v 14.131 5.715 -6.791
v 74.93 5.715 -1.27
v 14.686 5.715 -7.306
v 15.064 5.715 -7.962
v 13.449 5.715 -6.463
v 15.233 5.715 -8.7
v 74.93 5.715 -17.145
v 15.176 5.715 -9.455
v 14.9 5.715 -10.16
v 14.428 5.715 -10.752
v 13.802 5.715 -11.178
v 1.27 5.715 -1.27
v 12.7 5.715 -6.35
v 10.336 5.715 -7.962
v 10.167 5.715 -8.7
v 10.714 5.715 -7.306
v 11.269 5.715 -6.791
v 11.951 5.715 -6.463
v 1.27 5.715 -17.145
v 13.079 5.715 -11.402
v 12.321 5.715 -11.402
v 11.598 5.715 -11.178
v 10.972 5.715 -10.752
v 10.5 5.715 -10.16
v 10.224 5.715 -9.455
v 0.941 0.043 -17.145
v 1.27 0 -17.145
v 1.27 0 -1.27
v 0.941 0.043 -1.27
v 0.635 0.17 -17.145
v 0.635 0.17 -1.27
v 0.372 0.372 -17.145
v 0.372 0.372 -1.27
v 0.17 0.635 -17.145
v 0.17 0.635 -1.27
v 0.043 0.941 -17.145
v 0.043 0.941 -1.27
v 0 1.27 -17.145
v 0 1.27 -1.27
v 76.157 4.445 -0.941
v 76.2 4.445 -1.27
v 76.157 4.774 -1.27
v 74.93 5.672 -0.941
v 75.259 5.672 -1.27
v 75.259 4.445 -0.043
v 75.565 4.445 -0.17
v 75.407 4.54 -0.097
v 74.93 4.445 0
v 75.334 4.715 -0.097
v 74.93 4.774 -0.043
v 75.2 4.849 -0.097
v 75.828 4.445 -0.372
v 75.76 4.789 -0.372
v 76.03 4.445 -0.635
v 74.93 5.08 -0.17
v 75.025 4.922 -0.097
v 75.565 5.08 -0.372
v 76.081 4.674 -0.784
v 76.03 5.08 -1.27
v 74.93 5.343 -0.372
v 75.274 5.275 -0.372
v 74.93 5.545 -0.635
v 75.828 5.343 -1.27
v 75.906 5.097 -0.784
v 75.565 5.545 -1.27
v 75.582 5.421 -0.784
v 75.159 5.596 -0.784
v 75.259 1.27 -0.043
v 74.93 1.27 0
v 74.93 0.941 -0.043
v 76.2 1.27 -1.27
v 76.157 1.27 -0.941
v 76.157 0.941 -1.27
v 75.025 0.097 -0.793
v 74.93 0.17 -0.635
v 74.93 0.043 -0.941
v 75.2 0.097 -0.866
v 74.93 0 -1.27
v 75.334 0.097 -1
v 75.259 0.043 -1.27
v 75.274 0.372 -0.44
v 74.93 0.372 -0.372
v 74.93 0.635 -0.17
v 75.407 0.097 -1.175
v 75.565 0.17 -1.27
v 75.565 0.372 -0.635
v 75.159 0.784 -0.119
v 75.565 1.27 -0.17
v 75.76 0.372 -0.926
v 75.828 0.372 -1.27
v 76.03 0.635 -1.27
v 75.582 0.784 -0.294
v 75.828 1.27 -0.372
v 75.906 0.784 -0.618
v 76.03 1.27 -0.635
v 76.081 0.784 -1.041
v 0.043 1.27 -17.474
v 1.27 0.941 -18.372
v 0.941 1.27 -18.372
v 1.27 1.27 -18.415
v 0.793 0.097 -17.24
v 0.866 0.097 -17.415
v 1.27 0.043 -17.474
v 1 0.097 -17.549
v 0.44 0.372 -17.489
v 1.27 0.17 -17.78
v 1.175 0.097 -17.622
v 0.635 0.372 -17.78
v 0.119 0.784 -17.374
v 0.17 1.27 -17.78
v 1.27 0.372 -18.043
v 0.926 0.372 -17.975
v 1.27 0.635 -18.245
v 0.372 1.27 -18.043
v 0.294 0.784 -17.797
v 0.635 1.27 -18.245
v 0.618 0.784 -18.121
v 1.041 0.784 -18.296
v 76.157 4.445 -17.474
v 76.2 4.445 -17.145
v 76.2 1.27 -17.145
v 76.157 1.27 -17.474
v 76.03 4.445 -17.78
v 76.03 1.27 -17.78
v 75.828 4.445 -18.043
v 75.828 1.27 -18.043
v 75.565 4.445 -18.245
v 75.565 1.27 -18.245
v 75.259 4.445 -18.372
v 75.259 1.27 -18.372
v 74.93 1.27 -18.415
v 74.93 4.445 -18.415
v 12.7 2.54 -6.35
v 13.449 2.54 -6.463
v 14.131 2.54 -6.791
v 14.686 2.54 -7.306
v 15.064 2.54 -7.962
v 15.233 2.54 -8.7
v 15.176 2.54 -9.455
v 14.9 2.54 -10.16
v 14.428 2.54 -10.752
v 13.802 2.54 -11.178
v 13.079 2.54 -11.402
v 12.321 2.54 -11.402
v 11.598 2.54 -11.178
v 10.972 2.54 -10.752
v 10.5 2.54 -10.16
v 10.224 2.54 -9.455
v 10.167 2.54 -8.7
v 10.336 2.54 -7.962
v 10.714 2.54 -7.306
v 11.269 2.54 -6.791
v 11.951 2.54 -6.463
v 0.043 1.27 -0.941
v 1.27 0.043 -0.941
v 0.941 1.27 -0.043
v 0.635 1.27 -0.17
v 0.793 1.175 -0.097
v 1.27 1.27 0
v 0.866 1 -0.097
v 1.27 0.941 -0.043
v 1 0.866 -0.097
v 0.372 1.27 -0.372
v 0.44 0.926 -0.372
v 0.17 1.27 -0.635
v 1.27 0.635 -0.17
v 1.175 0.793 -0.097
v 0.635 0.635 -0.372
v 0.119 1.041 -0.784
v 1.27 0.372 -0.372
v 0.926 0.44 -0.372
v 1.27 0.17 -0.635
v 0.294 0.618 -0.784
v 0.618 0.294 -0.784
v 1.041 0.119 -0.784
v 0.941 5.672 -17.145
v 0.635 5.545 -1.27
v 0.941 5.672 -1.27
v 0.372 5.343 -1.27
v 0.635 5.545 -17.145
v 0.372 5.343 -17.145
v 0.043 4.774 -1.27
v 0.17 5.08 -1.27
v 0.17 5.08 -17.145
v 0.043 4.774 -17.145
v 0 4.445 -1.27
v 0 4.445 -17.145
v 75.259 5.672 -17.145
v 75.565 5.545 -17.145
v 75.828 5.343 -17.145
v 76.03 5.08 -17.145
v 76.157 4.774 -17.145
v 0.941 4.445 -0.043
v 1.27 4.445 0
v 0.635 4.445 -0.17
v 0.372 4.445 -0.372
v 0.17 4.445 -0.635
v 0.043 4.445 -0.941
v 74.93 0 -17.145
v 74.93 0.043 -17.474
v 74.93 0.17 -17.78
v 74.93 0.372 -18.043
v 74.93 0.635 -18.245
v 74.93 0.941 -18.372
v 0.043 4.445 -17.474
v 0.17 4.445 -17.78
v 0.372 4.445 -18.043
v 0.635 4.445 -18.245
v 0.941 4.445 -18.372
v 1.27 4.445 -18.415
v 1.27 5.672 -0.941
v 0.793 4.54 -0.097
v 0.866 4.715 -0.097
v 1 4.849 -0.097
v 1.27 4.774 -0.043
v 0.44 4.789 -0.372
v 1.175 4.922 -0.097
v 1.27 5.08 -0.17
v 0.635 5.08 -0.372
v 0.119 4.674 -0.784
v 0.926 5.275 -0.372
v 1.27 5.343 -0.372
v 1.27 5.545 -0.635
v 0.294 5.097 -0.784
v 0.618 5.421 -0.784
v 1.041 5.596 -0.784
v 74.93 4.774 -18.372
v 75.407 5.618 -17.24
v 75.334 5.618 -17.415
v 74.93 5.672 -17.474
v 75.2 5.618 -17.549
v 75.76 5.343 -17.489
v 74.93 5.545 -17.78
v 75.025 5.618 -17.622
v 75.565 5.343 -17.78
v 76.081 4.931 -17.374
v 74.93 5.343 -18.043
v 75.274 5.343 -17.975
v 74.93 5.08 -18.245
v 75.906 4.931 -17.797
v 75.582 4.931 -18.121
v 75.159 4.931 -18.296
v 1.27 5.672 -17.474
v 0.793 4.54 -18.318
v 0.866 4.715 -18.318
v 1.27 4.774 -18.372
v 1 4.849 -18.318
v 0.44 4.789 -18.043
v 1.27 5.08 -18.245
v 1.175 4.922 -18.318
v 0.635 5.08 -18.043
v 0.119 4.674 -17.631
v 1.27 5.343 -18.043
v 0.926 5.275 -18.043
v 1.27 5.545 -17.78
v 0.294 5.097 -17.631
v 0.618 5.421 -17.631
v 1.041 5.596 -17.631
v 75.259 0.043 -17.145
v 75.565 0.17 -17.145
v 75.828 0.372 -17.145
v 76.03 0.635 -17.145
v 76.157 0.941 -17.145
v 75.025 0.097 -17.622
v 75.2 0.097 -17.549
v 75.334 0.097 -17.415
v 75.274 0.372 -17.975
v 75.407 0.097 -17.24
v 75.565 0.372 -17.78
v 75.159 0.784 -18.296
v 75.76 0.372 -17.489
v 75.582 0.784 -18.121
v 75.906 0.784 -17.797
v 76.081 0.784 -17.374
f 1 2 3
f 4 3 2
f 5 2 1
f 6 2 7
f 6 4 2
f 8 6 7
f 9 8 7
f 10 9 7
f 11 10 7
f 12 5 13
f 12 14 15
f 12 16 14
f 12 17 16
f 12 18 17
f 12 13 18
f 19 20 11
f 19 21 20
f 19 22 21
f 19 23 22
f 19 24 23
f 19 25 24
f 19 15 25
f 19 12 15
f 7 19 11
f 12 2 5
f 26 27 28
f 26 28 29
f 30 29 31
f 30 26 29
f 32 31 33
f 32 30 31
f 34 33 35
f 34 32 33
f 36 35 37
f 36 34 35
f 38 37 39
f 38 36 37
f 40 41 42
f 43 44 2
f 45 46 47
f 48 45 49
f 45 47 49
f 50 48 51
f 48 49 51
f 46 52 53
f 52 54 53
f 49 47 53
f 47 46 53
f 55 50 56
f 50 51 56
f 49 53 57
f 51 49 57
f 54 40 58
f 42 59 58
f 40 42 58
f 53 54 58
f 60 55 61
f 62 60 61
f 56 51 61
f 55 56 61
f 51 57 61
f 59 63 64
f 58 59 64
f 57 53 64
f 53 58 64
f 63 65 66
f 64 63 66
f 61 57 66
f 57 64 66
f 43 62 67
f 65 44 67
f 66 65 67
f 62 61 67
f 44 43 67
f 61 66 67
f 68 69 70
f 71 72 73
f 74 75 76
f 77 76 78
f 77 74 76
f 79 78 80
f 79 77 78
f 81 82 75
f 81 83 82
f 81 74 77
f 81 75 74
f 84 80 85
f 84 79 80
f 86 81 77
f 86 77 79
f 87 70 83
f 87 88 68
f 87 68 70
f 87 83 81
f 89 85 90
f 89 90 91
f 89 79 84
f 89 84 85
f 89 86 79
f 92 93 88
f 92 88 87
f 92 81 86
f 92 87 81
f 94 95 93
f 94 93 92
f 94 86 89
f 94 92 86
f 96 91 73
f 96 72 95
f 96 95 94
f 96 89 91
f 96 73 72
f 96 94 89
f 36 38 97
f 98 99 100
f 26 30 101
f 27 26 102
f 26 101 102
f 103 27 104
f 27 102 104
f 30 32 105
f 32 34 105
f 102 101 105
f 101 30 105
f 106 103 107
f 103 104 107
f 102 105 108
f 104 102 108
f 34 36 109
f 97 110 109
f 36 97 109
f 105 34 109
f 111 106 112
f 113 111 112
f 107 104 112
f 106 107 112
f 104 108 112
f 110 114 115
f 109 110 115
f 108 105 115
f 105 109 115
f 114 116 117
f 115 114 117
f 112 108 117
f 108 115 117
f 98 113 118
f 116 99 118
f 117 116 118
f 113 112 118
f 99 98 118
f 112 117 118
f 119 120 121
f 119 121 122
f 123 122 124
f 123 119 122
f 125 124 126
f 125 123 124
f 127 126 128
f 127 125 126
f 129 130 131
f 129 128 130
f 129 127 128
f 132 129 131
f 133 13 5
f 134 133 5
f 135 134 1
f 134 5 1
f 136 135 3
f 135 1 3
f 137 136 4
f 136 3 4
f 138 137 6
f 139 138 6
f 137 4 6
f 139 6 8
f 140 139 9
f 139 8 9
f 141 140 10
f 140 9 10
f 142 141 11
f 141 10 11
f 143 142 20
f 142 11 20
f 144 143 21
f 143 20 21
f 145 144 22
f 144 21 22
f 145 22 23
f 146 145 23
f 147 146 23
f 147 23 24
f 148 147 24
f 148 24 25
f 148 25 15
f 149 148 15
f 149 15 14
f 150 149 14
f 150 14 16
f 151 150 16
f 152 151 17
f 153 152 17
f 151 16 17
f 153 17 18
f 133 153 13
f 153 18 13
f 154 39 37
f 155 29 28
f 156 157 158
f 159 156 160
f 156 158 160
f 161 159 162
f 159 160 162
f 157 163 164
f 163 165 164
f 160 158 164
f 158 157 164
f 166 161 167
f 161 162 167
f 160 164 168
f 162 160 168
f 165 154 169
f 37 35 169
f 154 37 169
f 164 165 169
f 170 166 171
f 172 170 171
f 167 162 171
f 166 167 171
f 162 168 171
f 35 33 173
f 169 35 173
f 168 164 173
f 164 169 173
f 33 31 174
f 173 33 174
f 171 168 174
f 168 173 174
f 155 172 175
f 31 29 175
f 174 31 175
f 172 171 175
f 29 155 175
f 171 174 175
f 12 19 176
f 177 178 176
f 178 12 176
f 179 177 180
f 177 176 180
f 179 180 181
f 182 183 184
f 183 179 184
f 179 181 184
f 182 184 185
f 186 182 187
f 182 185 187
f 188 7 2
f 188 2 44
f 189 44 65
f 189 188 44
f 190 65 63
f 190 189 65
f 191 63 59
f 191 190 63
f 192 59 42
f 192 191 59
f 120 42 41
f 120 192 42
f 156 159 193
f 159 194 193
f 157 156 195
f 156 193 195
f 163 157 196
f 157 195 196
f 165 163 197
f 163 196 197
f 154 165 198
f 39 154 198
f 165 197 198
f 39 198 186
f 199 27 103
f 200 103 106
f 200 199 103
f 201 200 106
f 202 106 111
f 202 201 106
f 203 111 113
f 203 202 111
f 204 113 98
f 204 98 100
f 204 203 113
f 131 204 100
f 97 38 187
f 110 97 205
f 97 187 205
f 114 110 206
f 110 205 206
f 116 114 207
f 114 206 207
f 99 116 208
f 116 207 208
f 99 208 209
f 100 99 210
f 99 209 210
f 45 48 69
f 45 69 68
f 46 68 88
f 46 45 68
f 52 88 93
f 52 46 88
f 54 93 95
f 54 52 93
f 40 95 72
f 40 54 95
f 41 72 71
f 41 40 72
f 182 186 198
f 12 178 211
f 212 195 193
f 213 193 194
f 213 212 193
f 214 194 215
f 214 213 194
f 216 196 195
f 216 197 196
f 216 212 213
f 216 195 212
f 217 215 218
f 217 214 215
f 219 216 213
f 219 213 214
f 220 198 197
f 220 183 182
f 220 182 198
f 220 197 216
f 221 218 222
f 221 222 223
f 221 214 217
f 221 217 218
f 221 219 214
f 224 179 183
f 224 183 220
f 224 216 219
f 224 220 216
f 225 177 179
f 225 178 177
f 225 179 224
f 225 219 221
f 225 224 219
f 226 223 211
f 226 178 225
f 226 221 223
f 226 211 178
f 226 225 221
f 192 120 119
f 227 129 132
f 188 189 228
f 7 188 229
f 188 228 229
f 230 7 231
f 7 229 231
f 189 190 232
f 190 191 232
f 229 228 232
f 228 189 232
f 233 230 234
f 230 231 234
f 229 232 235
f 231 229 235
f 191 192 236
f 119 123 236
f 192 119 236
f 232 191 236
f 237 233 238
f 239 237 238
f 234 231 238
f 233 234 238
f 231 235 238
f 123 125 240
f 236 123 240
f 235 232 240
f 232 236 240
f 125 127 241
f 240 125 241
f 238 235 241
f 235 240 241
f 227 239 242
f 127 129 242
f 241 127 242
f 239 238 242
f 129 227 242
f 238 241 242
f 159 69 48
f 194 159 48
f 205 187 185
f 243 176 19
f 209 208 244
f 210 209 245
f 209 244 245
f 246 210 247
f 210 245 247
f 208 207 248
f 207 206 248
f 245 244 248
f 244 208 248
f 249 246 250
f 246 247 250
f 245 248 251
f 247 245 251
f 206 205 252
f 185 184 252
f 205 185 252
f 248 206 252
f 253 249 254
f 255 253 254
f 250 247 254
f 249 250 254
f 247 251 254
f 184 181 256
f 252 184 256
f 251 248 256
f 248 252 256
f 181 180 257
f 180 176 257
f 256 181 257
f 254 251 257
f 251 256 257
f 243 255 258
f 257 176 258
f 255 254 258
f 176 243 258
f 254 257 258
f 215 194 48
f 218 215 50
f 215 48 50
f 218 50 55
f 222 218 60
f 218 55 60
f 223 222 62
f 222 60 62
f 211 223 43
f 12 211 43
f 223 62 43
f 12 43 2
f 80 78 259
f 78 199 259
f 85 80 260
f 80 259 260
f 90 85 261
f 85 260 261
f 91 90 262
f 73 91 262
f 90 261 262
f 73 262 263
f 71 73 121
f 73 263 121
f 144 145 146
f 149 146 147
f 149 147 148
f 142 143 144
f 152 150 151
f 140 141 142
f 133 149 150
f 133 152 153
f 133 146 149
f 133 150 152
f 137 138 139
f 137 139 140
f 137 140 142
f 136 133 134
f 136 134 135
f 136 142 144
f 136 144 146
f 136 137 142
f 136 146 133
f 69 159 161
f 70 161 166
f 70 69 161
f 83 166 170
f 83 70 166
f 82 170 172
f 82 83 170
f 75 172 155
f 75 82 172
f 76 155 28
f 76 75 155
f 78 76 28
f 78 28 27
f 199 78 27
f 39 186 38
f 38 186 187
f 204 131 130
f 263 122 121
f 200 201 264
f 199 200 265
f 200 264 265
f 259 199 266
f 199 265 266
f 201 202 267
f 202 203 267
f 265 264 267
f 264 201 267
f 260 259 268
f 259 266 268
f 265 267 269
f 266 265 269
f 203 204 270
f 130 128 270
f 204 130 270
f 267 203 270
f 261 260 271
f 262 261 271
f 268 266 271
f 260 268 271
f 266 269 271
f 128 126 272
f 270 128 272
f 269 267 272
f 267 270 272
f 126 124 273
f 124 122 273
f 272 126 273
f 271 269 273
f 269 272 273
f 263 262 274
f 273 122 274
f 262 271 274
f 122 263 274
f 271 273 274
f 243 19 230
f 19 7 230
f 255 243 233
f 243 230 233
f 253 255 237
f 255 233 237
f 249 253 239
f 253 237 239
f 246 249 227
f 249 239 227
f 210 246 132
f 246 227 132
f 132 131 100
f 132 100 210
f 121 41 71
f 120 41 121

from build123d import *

# Parameters (mm, degrees)
SKETCH1_W           = 18.415
SKETCH1_H           = 5.715
BOSS_EXTRUDE1_DEPTH = 76.2
SKETCH2_R           = 2.54
CUT_EXTRUDE1_DEPTH  = 3.175
FILLET1_R           = 1.27


with BuildPart() as part:
    # Sketch1 → Boss-Extrude1 (new body)
    with BuildSketch(Plane(origin=(0, 0, 0), x_dir=(0, 0, -1), z_dir=(1, 0, 0))):
        with Locations((9.2075, 2.8575)):
            Rectangle(SKETCH1_W, SKETCH1_H)
    extrude(amount=BOSS_EXTRUDE1_DEPTH)

    # Sketch2 → Cut-Extrude1 (cut)
    with BuildSketch(Plane(origin=(0, 5.715, 0), x_dir=(1, 0, 0), z_dir=(0, 1, 0))):
        with Locations(Location((12.7, 8.89, 0), (0, 0, 270))):
            Circle(SKETCH2_R)
    extrude(amount=-CUT_EXTRUDE1_DEPTH, mode=Mode.SUBTRACT)

    # Fillet1
    fillet1_edges = [part.edges().sort_by_distance(p)[0] for p in [
        (76.2, 2.8575, -18.415),
        (76.2, 5.715, -9.2075),
        (76.2, 2.8575, 0),
        (0, 5.715, -9.2075),
        (0, 2.8575, -18.415),
        (0, 0, -9.2075),
        (0, 2.8575, 0),
        (38.1, 5.715, 0),
        (38.1, 5.715, -18.415),
        (38.1, 0, -18.415),
        (38.1, 0, 0),
        (76.2, 0, -9.2075),
    ]]
    fillet(fillet1_edges, radius=FILLET1_R)


solid = part.part
